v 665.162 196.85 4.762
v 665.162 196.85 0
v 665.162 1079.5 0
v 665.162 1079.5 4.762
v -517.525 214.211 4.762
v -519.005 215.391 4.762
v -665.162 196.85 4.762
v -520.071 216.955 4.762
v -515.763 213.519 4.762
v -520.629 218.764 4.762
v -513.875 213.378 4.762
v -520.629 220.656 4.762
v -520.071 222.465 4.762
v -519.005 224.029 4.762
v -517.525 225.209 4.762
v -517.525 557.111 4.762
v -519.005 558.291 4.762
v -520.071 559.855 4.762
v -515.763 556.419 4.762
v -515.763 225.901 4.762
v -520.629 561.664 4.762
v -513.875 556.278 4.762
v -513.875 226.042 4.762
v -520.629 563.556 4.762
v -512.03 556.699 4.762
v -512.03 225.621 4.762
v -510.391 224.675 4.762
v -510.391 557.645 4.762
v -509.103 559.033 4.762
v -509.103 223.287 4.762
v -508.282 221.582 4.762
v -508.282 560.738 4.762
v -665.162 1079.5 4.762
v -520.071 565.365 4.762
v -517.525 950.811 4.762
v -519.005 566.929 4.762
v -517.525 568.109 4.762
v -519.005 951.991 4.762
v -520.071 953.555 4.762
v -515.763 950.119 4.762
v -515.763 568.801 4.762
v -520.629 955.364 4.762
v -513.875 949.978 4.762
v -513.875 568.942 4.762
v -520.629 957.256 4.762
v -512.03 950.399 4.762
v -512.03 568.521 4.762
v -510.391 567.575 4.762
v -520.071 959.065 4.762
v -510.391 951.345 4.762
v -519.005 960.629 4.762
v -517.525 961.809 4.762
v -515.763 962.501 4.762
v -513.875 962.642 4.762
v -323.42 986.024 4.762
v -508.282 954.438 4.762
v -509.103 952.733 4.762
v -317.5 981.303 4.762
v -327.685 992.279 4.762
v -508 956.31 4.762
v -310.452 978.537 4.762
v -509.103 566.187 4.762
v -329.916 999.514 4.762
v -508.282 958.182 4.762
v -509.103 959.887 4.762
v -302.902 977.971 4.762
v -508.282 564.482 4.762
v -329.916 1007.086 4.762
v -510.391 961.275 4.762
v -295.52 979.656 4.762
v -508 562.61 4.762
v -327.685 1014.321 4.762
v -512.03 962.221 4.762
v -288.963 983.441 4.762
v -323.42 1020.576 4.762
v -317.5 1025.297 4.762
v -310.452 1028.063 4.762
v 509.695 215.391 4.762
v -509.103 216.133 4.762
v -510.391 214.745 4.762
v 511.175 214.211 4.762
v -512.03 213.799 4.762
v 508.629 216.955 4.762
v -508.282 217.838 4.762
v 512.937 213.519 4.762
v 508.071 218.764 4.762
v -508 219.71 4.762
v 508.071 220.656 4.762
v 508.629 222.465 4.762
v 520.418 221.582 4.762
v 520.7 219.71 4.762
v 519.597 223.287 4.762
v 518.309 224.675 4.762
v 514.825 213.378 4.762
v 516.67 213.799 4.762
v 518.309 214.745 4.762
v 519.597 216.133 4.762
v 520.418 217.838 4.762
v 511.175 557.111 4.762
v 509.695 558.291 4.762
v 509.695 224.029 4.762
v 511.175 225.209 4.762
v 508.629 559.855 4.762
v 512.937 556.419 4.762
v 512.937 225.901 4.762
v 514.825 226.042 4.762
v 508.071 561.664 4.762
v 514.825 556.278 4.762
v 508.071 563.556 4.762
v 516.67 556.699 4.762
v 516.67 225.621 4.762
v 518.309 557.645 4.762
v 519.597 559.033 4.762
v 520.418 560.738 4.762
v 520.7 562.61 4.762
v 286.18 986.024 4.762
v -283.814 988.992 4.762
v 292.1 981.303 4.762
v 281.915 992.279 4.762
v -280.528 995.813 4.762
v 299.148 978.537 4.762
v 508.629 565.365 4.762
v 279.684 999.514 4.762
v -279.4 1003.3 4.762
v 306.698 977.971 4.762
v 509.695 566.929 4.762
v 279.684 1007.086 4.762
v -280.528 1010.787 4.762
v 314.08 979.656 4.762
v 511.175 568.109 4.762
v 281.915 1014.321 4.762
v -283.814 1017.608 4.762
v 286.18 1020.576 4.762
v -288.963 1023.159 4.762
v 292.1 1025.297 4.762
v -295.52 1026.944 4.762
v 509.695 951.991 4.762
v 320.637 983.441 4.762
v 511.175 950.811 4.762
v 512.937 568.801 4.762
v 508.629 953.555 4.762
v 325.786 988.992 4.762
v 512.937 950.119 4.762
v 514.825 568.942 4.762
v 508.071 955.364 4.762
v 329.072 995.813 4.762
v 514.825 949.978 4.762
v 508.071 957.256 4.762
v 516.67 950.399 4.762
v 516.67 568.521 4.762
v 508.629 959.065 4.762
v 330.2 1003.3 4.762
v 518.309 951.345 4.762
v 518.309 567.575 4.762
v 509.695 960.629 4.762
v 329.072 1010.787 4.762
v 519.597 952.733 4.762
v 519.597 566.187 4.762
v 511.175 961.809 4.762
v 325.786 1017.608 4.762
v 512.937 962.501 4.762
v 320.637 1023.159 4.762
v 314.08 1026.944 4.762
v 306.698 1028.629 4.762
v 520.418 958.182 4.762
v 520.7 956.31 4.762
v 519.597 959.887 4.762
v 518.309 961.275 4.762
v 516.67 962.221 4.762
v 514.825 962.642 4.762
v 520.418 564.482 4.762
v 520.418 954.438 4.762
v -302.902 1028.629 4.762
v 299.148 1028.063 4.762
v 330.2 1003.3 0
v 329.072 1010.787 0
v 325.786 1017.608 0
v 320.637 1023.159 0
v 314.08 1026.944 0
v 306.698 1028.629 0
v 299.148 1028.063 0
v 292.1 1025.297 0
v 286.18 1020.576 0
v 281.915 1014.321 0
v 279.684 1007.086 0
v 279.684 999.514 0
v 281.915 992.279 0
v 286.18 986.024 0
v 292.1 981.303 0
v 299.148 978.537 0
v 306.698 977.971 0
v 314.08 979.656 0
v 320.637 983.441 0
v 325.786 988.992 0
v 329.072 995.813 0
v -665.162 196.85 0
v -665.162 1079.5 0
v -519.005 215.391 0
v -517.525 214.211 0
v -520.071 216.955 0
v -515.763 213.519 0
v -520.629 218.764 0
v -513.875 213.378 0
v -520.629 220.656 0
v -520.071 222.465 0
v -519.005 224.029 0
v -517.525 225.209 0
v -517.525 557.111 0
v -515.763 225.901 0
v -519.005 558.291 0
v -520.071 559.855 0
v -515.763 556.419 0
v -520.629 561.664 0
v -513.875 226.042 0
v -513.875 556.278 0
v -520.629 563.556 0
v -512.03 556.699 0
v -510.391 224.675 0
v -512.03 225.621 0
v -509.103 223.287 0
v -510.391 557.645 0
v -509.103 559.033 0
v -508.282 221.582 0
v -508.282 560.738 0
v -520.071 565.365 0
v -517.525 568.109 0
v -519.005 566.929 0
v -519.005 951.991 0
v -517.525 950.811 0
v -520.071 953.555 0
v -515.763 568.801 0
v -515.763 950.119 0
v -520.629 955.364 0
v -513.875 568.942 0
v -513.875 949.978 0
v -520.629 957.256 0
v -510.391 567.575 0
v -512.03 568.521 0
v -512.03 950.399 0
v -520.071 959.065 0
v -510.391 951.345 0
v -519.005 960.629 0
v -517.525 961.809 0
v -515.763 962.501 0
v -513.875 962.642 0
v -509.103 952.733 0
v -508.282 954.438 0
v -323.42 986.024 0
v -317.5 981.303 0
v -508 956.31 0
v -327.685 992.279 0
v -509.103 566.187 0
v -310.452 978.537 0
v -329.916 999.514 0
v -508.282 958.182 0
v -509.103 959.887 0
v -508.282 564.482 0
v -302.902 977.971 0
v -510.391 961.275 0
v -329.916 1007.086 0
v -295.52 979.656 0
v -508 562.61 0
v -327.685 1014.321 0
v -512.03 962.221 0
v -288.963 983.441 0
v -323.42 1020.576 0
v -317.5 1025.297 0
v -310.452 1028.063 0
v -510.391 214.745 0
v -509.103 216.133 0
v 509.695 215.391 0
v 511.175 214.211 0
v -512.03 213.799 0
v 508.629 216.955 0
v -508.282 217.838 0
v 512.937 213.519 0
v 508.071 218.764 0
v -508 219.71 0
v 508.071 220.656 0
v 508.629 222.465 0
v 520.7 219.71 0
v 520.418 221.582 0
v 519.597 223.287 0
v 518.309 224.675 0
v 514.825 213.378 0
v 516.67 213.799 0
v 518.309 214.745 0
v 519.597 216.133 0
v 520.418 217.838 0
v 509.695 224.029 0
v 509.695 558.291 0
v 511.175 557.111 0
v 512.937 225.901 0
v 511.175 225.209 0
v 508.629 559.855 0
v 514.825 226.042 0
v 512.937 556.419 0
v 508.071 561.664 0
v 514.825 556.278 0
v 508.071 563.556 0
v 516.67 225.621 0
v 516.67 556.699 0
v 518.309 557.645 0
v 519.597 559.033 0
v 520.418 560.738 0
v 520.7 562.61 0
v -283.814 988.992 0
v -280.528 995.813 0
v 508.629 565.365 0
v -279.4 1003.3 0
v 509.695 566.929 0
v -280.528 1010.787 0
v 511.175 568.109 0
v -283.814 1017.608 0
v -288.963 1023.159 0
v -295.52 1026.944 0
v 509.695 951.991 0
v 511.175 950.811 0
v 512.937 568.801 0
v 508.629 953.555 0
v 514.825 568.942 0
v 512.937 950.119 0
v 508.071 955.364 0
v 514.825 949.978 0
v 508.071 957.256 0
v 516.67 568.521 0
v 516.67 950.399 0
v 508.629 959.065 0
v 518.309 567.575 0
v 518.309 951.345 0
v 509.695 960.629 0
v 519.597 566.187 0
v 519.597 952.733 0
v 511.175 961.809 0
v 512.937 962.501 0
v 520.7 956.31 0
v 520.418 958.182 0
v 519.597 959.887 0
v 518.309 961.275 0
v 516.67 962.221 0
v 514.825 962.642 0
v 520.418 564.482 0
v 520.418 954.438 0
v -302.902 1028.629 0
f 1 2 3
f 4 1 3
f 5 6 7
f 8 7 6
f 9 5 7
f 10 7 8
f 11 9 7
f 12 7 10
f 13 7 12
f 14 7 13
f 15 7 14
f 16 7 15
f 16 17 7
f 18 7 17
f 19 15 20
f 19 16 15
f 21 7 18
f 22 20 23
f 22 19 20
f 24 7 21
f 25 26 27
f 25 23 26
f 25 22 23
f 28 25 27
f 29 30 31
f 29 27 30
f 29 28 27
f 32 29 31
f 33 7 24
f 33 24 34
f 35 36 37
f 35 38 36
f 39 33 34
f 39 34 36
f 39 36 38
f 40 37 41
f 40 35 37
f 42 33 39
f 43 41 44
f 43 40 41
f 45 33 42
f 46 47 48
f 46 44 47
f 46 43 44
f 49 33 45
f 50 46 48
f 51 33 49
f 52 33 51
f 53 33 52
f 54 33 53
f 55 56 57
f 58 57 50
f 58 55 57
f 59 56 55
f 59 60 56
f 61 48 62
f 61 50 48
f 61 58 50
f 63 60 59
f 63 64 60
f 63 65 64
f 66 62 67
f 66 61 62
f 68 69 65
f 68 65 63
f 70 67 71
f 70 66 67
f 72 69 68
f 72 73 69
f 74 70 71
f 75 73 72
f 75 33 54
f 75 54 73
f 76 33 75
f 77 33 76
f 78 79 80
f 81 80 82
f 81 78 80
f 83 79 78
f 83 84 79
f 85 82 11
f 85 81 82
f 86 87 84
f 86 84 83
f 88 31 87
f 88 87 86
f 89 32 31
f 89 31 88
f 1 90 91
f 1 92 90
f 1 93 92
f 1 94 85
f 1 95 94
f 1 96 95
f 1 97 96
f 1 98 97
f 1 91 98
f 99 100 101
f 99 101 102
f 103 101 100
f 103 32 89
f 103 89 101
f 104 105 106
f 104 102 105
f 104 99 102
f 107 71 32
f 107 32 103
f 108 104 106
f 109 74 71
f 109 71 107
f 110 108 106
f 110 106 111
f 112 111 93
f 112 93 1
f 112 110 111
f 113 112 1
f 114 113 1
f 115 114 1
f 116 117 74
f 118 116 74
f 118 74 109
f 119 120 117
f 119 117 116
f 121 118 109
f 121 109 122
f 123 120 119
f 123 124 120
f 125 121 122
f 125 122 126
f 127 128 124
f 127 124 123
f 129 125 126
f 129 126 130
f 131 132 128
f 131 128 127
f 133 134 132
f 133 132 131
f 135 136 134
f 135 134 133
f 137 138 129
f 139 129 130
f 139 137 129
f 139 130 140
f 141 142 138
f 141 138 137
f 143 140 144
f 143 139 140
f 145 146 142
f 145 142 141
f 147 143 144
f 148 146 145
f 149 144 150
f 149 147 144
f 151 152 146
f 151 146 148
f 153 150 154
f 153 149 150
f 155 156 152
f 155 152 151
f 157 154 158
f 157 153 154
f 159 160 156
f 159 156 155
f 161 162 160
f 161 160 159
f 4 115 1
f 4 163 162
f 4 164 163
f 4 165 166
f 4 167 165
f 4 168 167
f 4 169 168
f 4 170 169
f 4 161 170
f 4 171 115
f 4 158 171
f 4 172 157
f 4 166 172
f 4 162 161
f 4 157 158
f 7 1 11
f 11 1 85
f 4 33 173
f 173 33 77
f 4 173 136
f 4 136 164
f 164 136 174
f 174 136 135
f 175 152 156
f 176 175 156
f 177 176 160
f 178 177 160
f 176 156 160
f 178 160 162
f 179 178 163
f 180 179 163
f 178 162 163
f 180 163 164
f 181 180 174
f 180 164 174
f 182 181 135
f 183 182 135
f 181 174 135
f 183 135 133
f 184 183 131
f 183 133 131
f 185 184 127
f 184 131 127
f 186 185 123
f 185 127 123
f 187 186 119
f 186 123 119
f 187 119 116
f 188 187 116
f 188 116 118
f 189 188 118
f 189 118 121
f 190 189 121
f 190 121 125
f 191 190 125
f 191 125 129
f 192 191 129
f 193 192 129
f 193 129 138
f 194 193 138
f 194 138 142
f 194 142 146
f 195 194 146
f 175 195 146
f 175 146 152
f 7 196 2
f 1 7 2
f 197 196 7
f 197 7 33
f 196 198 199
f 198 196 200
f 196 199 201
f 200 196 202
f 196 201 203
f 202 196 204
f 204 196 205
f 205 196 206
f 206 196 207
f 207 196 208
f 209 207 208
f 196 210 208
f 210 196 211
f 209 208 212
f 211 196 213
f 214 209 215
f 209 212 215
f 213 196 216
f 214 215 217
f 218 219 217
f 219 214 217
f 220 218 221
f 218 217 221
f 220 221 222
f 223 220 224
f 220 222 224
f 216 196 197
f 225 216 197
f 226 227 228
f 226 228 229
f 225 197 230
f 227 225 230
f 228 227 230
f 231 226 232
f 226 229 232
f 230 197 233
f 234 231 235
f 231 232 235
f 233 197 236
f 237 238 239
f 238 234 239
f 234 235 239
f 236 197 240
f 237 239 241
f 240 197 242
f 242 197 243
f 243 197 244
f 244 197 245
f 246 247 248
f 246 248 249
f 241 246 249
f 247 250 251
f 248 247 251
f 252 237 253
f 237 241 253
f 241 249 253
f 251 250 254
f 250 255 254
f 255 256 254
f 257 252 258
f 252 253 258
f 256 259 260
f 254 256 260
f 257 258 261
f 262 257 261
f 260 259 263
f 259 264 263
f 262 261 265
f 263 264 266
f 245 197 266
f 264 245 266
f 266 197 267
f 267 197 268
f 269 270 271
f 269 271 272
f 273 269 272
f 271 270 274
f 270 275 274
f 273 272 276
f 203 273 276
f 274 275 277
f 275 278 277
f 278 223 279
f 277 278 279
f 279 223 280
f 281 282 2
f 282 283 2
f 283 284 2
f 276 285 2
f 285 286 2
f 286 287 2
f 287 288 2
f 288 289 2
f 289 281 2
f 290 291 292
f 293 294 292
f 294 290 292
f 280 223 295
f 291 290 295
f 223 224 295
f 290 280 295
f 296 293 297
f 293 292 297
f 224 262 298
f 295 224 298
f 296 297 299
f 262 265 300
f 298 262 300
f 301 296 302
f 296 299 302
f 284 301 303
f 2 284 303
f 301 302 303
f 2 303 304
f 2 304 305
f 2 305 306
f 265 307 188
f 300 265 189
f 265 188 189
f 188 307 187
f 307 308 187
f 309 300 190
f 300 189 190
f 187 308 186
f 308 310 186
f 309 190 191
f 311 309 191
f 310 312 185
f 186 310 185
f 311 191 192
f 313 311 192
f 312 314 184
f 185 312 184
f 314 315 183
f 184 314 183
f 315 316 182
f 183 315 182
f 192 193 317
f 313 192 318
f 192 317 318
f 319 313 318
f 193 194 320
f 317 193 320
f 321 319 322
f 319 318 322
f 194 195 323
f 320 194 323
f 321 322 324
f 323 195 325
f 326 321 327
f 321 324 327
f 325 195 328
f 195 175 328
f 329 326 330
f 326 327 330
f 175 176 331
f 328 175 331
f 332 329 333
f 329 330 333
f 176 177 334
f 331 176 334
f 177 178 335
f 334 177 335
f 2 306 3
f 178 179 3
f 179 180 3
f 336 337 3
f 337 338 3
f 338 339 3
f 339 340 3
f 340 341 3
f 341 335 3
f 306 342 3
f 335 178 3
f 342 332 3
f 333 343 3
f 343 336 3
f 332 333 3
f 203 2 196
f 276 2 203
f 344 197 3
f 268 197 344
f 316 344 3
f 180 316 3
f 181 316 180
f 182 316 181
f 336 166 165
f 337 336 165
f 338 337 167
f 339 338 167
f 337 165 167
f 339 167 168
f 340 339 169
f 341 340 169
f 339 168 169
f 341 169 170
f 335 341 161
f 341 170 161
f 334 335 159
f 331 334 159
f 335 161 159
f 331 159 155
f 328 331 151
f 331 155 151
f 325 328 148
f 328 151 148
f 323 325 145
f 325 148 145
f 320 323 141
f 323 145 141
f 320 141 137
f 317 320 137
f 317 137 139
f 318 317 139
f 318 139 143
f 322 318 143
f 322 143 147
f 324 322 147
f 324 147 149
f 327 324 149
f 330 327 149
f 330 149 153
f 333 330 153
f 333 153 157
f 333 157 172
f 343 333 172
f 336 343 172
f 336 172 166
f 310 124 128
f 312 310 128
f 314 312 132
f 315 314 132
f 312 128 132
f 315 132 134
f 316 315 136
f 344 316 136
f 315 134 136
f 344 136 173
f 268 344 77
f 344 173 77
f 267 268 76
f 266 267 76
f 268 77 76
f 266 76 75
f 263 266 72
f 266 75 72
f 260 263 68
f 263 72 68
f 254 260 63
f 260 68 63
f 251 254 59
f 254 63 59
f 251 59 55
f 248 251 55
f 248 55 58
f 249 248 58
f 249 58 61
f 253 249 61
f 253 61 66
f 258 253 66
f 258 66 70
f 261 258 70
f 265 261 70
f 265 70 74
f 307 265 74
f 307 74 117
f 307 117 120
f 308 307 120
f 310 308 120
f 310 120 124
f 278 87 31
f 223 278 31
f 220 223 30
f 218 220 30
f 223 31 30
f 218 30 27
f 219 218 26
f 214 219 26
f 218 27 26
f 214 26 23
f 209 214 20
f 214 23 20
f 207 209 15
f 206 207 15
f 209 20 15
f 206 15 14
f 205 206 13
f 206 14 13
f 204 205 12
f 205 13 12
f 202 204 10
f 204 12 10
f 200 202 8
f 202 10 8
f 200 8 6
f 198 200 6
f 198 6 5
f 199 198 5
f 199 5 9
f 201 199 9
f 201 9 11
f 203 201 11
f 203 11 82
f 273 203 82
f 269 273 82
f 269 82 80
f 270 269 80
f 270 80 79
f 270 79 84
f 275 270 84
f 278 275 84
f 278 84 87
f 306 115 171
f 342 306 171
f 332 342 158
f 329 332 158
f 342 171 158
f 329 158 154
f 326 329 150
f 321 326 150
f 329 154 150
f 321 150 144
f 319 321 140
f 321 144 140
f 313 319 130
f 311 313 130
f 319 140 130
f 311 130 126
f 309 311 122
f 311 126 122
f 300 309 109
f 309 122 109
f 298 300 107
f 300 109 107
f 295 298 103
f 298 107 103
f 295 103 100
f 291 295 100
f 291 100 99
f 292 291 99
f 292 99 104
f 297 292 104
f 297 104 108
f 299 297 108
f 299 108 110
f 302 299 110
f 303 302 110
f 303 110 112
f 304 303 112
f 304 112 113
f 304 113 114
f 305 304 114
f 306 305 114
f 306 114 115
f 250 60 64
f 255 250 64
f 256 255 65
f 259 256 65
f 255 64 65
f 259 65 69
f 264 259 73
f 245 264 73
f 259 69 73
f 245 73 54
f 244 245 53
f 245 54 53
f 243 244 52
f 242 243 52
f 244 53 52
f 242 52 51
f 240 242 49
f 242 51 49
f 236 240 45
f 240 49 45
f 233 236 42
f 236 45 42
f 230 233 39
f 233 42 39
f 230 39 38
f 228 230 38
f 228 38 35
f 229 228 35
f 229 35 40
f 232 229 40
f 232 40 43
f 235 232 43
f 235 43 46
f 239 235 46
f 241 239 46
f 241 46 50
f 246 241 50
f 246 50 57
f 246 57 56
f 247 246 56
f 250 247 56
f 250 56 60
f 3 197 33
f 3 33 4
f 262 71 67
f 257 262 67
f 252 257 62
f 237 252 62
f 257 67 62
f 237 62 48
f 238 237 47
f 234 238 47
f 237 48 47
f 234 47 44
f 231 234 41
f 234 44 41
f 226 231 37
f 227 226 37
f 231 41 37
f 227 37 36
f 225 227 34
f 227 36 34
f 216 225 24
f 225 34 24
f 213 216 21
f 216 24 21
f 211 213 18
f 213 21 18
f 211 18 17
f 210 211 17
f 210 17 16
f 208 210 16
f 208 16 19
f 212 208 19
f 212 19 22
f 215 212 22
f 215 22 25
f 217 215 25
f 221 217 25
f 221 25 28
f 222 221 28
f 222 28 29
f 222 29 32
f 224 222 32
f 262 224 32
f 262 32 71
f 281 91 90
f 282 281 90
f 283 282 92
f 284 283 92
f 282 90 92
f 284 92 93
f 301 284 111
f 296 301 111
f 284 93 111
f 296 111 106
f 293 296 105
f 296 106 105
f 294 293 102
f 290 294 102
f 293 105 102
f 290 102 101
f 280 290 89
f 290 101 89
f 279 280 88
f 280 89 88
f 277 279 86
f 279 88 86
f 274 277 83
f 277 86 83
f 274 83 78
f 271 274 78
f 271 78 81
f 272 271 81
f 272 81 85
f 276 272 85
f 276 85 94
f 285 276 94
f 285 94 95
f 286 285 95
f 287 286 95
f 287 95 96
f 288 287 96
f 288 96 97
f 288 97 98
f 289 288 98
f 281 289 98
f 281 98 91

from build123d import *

# Parameters (mm, degrees)
SKETCH1_W          = 1330.325
SKETCH1_H          = 882.65
EXTRUDE1_DEPTH     = 4.7625
SKETCH2_R          = 6.35
CUT_EXTRUDE1_DEPTH = 5.7625
SKETCH3_R          = 25.4
CUT_EXTRUDE2_DEPTH = 5.7625


with BuildPart() as part:
    # Sketch1 → Extrude1 (new body)
    with BuildSketch(Plane.XY):
        with Locations((0, 638.175)):
            Rectangle(SKETCH1_W, SKETCH1_H)
    extrude(amount=EXTRUDE1_DEPTH)

    # Sketch2 → Cut-Extrude1 (cut, through all)
    with BuildSketch(Plane.XY.offset(4.7625)):
        with Locations((514.35, 956.31)):
            Circle(SKETCH2_R)
        with Locations((514.35, 562.61)):
            Circle(SKETCH2_R)
        with Locations((514.35, 219.71)):
            Circle(SKETCH2_R)
        with Locations((-514.35, 219.71)):
            Circle(SKETCH2_R)
        with Locations((-514.35, 562.61)):
            Circle(SKETCH2_R)
        with Locations((-514.35, 956.31)):
            Circle(SKETCH2_R)
    extrude(amount=-CUT_EXTRUDE1_DEPTH, mode=Mode.SUBTRACT)

    # Sketch3 → Cut-Extrude2 (cut, through all)
    with BuildSketch(Plane.XY.offset(4.7625)):
        with Locations((304.8, 1003.3)):
            Circle(SKETCH3_R)
        with Locations((-304.8, 1003.3)):
            Circle(SKETCH3_R)
    extrude(amount=-CUT_EXTRUDE2_DEPTH, mode=Mode.SUBTRACT)


solid = part.part
